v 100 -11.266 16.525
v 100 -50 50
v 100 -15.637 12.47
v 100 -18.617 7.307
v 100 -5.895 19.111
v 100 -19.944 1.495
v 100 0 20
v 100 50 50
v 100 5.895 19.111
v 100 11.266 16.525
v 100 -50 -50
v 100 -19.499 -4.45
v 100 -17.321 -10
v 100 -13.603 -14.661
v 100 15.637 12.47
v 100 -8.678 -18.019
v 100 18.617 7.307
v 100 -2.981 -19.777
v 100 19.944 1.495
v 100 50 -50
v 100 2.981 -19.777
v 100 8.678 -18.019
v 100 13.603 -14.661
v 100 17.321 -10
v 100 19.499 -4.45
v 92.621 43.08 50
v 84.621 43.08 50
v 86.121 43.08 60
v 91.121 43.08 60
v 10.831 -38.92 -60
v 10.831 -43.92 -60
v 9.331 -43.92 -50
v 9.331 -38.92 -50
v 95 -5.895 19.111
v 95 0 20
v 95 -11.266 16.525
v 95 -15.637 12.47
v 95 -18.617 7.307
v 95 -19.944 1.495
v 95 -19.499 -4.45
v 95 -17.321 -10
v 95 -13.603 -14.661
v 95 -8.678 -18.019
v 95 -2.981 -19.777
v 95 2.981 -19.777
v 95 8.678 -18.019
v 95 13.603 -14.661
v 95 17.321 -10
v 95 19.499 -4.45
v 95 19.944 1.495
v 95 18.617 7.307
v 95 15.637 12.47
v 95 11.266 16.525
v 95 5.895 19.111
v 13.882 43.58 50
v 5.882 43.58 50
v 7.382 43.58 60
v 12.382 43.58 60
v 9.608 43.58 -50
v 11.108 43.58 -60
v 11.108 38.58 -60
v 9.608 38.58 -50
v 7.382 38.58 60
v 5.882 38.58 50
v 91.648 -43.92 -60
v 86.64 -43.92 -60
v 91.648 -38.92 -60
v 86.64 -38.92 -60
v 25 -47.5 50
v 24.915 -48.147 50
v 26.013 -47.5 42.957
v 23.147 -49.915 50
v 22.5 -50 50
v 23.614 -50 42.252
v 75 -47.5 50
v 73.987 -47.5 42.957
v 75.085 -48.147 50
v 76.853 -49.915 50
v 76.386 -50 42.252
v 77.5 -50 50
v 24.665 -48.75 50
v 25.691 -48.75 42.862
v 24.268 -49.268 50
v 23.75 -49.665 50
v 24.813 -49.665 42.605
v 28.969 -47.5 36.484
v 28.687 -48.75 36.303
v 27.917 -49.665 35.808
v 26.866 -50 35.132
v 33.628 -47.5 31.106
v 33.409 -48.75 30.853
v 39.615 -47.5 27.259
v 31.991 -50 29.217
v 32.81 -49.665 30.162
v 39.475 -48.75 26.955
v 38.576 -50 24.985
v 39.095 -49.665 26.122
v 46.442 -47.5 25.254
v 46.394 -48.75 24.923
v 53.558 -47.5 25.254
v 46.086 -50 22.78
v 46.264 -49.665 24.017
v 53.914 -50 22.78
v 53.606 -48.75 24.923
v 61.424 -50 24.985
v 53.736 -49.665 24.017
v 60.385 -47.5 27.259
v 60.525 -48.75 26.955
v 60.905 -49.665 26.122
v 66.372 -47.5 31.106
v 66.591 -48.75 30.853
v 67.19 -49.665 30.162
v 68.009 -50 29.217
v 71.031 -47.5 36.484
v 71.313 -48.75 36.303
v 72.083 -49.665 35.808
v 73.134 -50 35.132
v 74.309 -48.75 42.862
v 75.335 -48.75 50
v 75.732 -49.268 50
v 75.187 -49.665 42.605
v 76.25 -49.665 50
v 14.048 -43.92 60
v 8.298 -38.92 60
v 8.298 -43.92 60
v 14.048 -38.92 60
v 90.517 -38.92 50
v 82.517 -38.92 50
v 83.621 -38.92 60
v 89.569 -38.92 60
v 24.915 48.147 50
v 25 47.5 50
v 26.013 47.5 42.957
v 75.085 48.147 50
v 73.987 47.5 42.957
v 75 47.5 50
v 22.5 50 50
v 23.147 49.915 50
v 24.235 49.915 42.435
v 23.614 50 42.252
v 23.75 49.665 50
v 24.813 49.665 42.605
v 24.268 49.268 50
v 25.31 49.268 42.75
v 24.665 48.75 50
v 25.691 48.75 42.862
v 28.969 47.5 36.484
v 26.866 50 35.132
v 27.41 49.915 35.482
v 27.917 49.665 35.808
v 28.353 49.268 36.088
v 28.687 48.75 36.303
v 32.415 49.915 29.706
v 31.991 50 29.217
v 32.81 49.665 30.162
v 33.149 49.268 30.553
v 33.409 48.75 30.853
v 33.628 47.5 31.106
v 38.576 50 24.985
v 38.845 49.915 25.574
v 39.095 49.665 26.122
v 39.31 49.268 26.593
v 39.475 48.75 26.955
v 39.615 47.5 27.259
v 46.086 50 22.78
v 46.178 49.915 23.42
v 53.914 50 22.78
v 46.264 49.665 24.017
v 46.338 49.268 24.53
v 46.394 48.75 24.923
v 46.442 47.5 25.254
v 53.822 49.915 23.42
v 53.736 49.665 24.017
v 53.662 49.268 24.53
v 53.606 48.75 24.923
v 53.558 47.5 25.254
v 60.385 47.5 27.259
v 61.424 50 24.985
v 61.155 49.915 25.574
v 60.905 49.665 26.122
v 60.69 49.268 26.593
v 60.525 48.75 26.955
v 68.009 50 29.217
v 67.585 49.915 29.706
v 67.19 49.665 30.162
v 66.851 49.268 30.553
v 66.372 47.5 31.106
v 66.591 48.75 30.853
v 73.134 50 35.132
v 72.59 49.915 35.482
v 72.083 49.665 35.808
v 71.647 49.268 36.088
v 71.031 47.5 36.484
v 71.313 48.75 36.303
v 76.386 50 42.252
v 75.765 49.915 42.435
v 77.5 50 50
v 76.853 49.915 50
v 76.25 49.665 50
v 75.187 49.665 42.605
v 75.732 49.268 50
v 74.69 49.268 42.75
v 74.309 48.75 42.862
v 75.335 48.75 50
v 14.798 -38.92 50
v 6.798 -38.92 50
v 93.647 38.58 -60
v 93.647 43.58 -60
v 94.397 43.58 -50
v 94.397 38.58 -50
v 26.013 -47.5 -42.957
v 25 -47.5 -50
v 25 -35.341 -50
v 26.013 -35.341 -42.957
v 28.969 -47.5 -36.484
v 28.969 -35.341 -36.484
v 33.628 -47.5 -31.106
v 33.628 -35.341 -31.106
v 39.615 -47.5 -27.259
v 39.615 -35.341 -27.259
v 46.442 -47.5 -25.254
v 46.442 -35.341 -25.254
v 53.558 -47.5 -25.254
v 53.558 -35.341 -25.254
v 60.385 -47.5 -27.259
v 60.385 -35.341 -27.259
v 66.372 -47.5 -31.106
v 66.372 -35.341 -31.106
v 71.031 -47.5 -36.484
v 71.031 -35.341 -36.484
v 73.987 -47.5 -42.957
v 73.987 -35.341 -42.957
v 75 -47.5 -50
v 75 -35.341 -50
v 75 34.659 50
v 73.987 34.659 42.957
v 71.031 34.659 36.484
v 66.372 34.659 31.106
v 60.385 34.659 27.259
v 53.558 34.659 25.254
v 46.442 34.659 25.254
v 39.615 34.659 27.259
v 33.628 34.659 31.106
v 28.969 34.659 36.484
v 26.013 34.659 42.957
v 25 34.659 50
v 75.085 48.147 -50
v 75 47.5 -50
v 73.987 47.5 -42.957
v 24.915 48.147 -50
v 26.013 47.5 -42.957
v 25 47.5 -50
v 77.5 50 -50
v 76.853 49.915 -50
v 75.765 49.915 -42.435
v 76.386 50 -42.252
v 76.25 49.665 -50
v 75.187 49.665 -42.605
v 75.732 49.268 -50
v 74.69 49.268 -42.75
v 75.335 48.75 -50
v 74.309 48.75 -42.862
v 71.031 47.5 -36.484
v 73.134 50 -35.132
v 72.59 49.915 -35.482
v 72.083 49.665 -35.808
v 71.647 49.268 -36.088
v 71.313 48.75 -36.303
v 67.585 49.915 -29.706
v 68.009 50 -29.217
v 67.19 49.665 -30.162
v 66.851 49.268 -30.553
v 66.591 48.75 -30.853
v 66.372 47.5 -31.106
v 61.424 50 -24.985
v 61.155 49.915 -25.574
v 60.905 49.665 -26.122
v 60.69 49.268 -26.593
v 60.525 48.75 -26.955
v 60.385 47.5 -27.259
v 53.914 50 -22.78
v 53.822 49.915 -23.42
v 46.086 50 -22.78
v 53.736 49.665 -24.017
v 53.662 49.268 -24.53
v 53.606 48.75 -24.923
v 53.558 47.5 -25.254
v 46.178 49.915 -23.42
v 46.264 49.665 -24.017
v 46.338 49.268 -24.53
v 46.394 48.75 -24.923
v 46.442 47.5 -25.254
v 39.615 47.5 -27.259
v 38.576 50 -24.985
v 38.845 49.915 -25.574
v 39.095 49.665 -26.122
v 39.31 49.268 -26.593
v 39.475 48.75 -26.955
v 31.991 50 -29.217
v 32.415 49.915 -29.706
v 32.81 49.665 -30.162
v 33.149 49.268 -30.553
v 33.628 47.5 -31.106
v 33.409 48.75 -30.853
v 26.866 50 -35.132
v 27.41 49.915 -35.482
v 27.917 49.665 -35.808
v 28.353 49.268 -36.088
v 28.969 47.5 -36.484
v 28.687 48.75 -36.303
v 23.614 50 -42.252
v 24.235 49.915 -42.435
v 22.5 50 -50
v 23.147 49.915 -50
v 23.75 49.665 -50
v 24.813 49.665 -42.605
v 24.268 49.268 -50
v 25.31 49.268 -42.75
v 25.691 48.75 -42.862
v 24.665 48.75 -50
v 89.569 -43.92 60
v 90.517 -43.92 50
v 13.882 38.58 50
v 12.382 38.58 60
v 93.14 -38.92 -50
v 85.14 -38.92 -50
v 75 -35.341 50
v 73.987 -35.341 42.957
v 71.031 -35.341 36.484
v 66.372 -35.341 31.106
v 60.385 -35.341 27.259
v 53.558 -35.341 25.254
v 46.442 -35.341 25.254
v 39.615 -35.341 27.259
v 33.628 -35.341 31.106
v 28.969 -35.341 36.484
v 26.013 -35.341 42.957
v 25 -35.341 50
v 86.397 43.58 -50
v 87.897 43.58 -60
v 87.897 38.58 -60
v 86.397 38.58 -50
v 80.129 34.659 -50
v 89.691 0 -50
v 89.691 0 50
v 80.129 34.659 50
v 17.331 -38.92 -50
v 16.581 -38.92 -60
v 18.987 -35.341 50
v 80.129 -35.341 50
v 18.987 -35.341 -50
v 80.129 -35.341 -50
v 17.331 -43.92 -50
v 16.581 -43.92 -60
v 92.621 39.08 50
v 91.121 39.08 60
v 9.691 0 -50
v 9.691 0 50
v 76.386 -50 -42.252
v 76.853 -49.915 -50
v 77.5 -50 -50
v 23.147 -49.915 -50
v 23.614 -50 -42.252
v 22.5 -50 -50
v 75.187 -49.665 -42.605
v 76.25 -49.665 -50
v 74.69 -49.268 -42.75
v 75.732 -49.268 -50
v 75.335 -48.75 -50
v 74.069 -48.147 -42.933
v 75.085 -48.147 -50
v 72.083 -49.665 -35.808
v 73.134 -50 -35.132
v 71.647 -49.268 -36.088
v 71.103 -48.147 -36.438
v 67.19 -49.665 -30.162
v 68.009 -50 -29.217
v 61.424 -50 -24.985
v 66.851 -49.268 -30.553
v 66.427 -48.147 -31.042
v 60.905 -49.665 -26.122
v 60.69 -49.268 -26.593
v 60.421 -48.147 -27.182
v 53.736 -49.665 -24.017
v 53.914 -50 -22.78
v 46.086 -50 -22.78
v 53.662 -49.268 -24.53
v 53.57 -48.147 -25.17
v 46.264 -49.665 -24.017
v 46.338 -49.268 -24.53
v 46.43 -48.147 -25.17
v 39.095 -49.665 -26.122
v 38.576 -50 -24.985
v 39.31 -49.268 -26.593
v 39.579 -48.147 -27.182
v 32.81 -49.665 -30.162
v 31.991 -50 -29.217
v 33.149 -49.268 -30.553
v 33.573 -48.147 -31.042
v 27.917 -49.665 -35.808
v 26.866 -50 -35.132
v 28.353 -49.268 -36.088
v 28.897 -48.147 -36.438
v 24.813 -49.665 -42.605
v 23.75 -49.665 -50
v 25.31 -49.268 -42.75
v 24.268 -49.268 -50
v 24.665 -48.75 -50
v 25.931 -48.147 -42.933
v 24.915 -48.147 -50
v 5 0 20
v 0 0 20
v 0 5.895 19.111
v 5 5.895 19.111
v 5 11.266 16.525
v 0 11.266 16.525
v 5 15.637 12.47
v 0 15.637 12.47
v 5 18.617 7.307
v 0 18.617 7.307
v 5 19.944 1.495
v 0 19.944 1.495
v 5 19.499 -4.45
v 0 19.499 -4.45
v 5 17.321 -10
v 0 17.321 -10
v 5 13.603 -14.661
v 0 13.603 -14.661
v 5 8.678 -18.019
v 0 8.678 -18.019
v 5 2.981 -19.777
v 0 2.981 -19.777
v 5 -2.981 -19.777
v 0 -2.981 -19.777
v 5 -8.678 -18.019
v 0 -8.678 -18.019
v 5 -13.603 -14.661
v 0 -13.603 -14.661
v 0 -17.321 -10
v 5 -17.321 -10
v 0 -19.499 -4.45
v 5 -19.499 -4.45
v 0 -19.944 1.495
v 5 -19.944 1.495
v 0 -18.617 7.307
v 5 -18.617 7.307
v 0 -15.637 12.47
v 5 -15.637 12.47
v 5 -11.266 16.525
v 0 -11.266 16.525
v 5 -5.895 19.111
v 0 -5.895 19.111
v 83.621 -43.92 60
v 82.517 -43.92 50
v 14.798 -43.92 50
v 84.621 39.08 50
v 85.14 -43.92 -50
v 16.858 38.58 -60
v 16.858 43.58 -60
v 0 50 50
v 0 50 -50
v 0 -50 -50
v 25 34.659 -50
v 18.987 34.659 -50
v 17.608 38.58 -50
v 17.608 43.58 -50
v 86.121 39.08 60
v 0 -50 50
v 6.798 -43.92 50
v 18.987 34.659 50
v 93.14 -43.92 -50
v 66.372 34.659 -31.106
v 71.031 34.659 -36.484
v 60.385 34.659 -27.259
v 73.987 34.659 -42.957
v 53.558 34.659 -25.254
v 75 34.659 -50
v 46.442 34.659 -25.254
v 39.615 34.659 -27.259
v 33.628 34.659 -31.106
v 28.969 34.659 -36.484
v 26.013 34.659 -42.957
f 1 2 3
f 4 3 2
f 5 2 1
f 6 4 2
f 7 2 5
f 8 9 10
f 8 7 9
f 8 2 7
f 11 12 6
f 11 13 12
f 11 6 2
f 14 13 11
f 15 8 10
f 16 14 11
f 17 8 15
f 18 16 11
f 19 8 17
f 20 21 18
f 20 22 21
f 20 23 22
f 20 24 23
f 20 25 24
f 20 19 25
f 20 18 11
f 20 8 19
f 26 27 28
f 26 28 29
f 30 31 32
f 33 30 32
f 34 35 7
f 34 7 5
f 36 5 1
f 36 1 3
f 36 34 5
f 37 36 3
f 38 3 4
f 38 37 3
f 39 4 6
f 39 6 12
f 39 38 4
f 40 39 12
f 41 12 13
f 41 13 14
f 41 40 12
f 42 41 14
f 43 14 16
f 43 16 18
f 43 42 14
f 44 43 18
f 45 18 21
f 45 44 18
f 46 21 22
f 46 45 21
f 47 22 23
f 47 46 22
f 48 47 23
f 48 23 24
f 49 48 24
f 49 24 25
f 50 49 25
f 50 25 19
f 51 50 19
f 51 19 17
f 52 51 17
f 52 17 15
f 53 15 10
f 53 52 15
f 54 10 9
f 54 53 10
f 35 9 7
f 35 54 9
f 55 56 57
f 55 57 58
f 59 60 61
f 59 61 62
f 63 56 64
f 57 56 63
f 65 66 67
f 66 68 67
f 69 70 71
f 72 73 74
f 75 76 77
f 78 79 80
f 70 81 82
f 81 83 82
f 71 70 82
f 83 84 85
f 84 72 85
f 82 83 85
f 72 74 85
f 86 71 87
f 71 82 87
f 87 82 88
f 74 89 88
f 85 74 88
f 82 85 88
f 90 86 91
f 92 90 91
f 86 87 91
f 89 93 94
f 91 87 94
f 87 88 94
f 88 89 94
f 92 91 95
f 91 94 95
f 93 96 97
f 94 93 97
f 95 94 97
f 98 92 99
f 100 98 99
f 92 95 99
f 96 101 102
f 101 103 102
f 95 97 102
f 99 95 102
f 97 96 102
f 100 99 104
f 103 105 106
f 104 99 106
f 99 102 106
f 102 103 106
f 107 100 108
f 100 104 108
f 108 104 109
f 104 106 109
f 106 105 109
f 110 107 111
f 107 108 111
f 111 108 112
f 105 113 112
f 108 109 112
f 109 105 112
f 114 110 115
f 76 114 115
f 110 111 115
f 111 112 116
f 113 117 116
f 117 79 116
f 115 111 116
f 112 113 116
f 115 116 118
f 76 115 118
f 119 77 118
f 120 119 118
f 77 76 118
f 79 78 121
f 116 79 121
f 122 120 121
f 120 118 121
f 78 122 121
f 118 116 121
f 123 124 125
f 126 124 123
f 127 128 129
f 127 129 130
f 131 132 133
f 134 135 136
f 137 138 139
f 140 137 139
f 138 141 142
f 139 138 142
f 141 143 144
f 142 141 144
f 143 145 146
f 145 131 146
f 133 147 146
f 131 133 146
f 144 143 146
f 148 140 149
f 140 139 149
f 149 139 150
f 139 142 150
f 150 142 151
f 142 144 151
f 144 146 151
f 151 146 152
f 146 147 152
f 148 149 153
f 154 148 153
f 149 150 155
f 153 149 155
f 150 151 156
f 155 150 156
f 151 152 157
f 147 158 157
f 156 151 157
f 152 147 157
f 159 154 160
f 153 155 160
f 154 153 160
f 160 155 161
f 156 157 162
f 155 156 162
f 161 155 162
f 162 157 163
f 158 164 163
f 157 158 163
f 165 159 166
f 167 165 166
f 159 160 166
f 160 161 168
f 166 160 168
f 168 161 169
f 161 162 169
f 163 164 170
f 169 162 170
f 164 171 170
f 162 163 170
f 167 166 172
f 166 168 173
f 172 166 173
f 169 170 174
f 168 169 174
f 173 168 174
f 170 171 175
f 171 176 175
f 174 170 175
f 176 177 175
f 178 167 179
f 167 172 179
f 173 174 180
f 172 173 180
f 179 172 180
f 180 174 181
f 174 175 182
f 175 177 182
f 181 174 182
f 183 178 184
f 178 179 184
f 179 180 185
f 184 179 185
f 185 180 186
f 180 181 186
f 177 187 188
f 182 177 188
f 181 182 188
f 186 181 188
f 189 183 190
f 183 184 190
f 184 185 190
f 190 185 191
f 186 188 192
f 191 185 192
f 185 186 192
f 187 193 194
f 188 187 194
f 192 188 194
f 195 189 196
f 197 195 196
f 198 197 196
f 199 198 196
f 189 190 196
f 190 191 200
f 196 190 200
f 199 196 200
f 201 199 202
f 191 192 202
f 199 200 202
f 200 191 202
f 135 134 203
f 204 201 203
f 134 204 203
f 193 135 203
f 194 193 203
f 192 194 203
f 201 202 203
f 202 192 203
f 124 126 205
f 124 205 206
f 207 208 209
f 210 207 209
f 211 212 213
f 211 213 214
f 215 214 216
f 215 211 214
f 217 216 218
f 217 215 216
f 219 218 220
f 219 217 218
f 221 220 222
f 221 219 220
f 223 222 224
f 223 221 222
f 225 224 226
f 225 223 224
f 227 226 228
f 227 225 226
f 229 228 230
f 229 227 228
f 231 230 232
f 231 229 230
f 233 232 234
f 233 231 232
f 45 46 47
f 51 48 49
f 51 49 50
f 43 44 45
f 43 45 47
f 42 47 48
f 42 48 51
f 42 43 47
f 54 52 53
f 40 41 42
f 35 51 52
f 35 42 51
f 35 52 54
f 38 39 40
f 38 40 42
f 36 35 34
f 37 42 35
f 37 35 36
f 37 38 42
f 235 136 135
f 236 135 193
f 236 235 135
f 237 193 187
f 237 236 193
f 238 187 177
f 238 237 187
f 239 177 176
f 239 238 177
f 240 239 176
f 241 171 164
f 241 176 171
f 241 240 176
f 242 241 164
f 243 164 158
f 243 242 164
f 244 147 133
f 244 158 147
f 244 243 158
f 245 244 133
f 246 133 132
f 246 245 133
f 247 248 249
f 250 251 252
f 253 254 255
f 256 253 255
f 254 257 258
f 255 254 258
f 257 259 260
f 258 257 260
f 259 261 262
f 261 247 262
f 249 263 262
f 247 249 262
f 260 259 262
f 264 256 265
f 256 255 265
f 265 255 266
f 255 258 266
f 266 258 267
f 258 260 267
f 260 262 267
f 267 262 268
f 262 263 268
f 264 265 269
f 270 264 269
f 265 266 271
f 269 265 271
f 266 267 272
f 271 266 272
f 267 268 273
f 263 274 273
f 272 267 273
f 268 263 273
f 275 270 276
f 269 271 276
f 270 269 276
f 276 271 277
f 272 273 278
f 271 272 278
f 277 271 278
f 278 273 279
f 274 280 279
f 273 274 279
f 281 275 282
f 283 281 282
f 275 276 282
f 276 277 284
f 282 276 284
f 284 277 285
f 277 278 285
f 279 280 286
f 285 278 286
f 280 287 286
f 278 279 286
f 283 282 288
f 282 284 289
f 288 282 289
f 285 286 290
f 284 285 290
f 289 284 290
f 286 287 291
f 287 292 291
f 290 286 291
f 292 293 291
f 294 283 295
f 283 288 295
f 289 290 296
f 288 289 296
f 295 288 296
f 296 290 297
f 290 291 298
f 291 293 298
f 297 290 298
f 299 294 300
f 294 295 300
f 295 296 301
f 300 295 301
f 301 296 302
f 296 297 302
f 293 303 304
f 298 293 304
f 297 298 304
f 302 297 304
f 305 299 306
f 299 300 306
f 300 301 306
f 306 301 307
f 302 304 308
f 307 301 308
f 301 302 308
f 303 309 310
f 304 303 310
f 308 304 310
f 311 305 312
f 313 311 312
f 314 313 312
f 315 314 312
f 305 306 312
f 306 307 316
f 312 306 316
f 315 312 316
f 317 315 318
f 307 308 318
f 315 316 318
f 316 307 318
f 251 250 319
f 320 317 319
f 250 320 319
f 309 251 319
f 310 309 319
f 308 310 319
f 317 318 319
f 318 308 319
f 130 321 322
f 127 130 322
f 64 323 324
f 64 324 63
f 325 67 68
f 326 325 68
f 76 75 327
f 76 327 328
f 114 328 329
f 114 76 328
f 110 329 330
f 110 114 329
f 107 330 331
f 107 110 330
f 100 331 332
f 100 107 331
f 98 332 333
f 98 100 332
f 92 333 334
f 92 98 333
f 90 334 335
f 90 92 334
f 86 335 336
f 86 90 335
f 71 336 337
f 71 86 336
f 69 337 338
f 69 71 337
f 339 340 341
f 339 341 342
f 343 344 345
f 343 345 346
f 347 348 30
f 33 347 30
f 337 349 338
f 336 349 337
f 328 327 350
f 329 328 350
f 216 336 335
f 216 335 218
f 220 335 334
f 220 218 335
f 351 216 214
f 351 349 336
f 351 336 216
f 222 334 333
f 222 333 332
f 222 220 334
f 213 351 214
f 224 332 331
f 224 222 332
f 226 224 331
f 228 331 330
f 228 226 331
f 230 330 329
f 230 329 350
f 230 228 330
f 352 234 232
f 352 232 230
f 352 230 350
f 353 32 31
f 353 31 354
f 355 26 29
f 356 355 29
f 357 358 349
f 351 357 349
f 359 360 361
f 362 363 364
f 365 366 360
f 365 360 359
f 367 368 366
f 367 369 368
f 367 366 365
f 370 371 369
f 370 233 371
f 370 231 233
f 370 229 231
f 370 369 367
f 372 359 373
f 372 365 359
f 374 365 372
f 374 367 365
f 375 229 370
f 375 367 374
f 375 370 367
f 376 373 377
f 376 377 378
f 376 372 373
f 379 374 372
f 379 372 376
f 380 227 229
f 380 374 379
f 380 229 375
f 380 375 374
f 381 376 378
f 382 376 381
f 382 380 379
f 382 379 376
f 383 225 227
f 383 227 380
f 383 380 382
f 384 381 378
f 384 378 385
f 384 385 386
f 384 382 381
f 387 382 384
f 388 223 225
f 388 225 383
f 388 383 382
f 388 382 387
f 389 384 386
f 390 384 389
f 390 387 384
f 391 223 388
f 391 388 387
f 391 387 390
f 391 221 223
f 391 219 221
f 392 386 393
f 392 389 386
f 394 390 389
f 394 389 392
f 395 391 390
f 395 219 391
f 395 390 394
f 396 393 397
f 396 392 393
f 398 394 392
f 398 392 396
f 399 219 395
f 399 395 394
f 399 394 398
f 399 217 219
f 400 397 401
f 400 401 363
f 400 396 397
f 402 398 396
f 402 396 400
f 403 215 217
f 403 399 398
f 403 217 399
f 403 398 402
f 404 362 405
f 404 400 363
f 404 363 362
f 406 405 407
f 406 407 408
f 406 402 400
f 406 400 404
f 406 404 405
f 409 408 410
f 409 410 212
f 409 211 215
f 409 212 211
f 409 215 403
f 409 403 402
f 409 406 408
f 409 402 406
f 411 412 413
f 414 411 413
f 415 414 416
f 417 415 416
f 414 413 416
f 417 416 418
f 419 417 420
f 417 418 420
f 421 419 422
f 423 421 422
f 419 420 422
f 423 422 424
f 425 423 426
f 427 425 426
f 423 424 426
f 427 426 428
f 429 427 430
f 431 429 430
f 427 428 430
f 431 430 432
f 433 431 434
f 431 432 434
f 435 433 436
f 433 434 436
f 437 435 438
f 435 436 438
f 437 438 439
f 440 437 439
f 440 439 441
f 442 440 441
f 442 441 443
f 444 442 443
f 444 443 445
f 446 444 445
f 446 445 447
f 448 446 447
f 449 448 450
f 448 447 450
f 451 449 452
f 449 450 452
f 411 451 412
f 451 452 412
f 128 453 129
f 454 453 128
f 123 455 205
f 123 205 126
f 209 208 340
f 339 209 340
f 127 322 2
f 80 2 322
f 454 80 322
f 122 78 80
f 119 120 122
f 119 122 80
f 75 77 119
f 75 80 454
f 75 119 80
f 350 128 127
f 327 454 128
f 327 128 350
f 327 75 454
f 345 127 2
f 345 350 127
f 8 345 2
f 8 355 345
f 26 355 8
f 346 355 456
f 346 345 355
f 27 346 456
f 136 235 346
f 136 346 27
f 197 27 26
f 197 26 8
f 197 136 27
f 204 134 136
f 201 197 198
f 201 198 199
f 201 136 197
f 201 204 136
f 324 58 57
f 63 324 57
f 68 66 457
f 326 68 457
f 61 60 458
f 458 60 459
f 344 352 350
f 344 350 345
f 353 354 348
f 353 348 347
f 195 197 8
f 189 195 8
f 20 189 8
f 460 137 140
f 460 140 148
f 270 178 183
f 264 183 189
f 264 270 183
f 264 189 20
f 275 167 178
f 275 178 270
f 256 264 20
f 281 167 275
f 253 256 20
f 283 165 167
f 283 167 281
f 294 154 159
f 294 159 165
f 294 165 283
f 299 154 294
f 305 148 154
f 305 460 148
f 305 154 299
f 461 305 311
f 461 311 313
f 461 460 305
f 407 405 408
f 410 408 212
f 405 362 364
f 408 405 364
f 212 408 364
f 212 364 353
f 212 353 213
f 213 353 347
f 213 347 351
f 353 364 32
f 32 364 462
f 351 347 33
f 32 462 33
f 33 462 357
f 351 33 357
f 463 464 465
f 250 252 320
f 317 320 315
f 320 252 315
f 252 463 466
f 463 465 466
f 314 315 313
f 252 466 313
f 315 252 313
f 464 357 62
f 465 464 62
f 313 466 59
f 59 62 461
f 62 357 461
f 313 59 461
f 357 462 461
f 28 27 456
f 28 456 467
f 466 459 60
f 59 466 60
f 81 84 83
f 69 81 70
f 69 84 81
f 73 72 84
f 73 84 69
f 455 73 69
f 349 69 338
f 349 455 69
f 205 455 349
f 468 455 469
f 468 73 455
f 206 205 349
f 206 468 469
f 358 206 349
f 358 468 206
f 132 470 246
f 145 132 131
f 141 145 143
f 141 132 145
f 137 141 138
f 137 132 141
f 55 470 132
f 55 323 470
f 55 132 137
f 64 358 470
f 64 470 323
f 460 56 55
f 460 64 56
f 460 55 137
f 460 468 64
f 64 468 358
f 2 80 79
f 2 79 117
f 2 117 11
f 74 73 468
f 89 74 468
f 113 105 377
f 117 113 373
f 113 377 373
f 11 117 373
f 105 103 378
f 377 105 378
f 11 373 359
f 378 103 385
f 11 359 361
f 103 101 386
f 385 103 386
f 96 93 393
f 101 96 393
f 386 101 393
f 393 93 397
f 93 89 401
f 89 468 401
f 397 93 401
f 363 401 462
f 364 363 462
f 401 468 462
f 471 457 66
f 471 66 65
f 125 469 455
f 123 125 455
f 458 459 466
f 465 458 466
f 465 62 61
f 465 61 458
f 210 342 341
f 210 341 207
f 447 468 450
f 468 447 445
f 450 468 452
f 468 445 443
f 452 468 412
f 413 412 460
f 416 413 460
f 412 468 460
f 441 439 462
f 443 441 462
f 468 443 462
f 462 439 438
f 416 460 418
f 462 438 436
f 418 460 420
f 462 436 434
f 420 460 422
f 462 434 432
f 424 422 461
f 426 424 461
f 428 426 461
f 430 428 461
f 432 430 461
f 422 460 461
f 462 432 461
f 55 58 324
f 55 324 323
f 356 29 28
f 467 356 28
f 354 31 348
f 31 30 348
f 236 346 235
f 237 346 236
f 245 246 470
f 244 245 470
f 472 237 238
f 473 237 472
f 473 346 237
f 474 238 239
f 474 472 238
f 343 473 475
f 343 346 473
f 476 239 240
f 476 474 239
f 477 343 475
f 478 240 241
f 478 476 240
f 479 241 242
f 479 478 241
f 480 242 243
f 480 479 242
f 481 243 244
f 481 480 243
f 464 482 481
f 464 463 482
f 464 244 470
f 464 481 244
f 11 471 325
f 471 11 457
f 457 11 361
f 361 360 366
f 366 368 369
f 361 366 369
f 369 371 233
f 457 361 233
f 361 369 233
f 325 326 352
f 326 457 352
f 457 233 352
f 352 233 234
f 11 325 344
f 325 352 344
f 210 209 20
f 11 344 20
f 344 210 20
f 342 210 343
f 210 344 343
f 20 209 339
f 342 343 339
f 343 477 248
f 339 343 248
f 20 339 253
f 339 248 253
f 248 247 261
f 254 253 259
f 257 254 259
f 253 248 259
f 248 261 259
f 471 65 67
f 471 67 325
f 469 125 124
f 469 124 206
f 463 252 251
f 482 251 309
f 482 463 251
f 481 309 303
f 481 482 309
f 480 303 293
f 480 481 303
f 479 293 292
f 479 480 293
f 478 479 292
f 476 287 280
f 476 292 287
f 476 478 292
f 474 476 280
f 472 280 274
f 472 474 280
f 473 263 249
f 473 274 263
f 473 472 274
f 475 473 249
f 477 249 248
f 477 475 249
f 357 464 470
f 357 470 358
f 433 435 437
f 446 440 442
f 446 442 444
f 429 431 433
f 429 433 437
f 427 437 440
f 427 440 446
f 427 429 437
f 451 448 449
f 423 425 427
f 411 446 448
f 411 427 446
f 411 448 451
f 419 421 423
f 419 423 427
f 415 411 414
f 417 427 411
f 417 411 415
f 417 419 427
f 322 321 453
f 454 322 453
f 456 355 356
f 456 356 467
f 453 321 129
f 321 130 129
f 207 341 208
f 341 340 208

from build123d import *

# Parameters (mm, degrees)
SKETCH1_W               = 100
SKETCH1_H               = 100
BOSS_EXTRUDE1_DEPTH     = 100
SKETCH2_R               = 20
CUT_EXTRUDE1_DEPTH      = 5
CUT_EXTRUDE2_START      = -5
SKETCH3_R               = 20
CUT_EXTRUDE2_DEPTH      = 5
CUT_EXTRUDE3_DEPTH      = 151
CUT_EXTRUDE5_DEPTH      = 151
CUT_EXTRUDE5_DEPTH_BACK = 151
CUT_EXTRUDE6_DEPTH      = 151
CUT_EXTRUDE6_DEPTH_BACK = 151
FILLET3_R               = 2.5
BOSS_EXTRUDE3_DEPTH     = 10
CUT_EXTRUDE8_DEPTH      = 10
CUT_EXTRUDE9_DEPTH      = 10
BOSS_EXTRUDE4_DEPTH     = 10
CUT_EXTRUDE11_DEPTH     = 10
CUT_EXTRUDE12_DEPTH     = 10
BOSS_EXTRUDE5_DEPTH     = 10
CUT_EXTRUDE13_DEPTH     = 10
CUT_EXTRUDE15_DEPTH     = 10
BOSS_EXTRUDE6_DEPTH     = 10
CUT_EXTRUDE16_DEPTH     = 10
CUT_EXTRUDE17_DEPTH     = 10
BOSS_EXTRUDE7_DEPTH     = 10
CUT_EXTRUDE18_DEPTH     = 10
CUT_EXTRUDE19_DEPTH     = 10
BOSS_EXTRUDE8_DEPTH     = 10
CUT_EXTRUDE20_DEPTH     = 10
CUT_EXTRUDE21_DEPTH     = 10
BOSS_EXTRUDE9_DEPTH     = 10
CUT_EXTRUDE22_DEPTH     = 10
CUT_EXTRUDE23_DEPTH     = 10
BOSS_EXTRUDE10_DEPTH    = 10
CUT_EXTRUDE24_DEPTH     = 10
CUT_EXTRUDE25_DEPTH     = 10


with BuildPart() as part:
    # Sketch1 → Boss-Extrude1 (new body)
    with BuildSketch(Plane(origin=(0, 0, 0), x_dir=(0, 0, -1), z_dir=(1, 0, 0))):
        Rectangle(SKETCH1_W, SKETCH1_H)
    extrude(amount=BOSS_EXTRUDE1_DEPTH)

    # Sketch2 → Cut-Extrude1 (cut)
    with BuildSketch(Plane.ZY):
        Circle(SKETCH2_R)
    extrude(amount=-CUT_EXTRUDE1_DEPTH, mode=Mode.SUBTRACT)

    # Sketch3 → Cut-Extrude2 (cut)
    with BuildSketch(Plane(origin=(100, 0, 0), x_dir=(0, 0, -1), z_dir=(1, 0, 0)).offset(CUT_EXTRUDE2_START)):
        with Locations(Location((0, 0, 0), (0, 0, 180))):
            Circle(SKETCH3_R)
    extrude(amount=CUT_EXTRUDE2_DEPTH, mode=Mode.SUBTRACT)

    # Sketch4 → Cut-Extrude3 (cut, through all)
    with BuildSketch(Plane(origin=(0, 0, -50), x_dir=(-1, 0, 0), z_dir=(0, 0, -1))):
        Polygon((-80.128941466, 34.659382406), (-18.986632905, 34.659382406), (-9.691227462, 0), (-18.986632905, -35.340617594), (-80.128941466, -35.340617594), (-89.691227462, 0), align=None)
    extrude(amount=-CUT_EXTRUDE3_DEPTH, mode=Mode.SUBTRACT)

    # Sketch15 → Cut-Extrude5 (cut, two sides: drawn at the far end of the back side and taken through both)
    with BuildSketch(Plane(origin=(0, 50, 0), x_dir=(1, 0, 0), z_dir=(0, 1, 0)).offset(-CUT_EXTRUDE5_DEPTH_BACK)):
        with BuildLine():
            Line((75, -310), (75, -50))
            ThreePointArc((75, -50), (50, -25), (25, -50))
            Line((25, -50), (25, -310))
            Line((25, -310), (25, -830))
            Line((25, -830), (75, -830))
            Line((75, -830), (75, -310))
        make_face()
    extrude(amount=CUT_EXTRUDE5_DEPTH + CUT_EXTRUDE5_DEPTH_BACK, mode=Mode.SUBTRACT)

    # Sketch16 → Cut-Extrude6 (cut, two sides: drawn at the far end of the back side and taken through both)
    with BuildSketch(Plane(origin=(0, 50, 0), x_dir=(1, 0, 0), z_dir=(0, 1, 0)).offset(-CUT_EXTRUDE6_DEPTH_BACK)):
        with BuildLine():
            Line((25, 310), (25, 50))
            ThreePointArc((25, 50), (50, 25), (75, 50))
            Line((75, 50), (75, 310))
            Line((75, 310), (75, 830))
            Line((75, 830), (25, 830))
            Line((25, 830), (25, 310))
        make_face()
    extrude(amount=CUT_EXTRUDE6_DEPTH + CUT_EXTRUDE6_DEPTH_BACK, mode=Mode.SUBTRACT)

    # Fillet3
    fillet3_edges = [part.edges().sort_by_distance(p)[0] for p in [
        (50, -50, 25),
        (50, 50, 25),
        (50, -50, -25),
        (50, 50, -25),
    ]]
    fillet(fillet3_edges, radius=FILLET3_R)

    # Sketch17 → Boss-Extrude3 (add)
    with BuildSketch(Plane.XY.offset(50)):
        with BuildLine():
            Line((84.621199284, 43.079691203), (92.621199284, 43.079691203))
            ThreePointArc((92.621199284, 43.079691203), (94.621199284, 41.079691203), (92.621199284, 39.079691203))
            Line((92.621199284, 39.079691203), (84.621199284, 39.079691203))
            ThreePointArc((84.621199284, 39.079691203), (82.621199284, 41.079691203), (84.621199284, 43.079691203))
        make_face()
    extrude(amount=BOSS_EXTRUDE3_DEPTH)

    # Sketch18 → Cut-Extrude8 (cut)
    with BuildSketch(Plane(origin=(0, 43.079691203, 0), x_dir=(1, 0, 0), z_dir=(0, 1, 0))):
        Polygon((84.621199284, -50), (86.121199284, -60), (82.621199284, -60), (82.621199284, -50), align=None)
    extrude(amount=-CUT_EXTRUDE8_DEPTH, mode=Mode.SUBTRACT)

    # Sketch20 → Cut-Extrude9 (cut)
    with BuildSketch(Plane(origin=(0, 43.079691203, 0), x_dir=(1, 0, 0), z_dir=(0, 1, 0))):
        Polygon((91.121199284, -60), (94.621199284, -60), (94.621199284, -50), (92.621199284, -50), align=None)
    extrude(amount=-CUT_EXTRUDE9_DEPTH, mode=Mode.SUBTRACT)

    # Sketch24 → Boss-Extrude4 (add)
    with BuildSketch(Plane.XY.offset(50)):
        with BuildLine():
            Line((5.882221412, 43.579691203), (13.882221412, 43.579691203))
            ThreePointArc((13.882221412, 43.579691203), (16.382221412, 41.079691203), (13.882221412, 38.579691203))
            Line((13.882221412, 38.579691203), (5.882221412, 38.579691203))
            ThreePointArc((5.882221412, 38.579691203), (3.382221412, 41.079691203), (5.882221412, 43.579691203))
        make_face()
    extrude(amount=BOSS_EXTRUDE4_DEPTH)

    # Sketch25 → Cut-Extrude11 (cut)
    with BuildSketch(Plane(origin=(0, 43.579691203, 0), x_dir=(1, 0, 0), z_dir=(0, 1, 0))):
        Polygon((3.382221412, -50), (5.882221412, -50), (7.382221412, -60), (3.382221412, -60), align=None)
    extrude(amount=-CUT_EXTRUDE11_DEPTH, mode=Mode.SUBTRACT)

    # Sketch26 → Cut-Extrude12 (cut)
    with BuildSketch(Plane(origin=(0, 43.579691203, 0), x_dir=(1, 0, 0), z_dir=(0, 1, 0))):
        Polygon((12.382221412, -60), (13.882221412, -50), (16.382221412, -50), (16.382221412, -60), align=None)
    extrude(amount=-CUT_EXTRUDE12_DEPTH, mode=Mode.SUBTRACT)

    # Sketch27 → Boss-Extrude5 (add)
    with BuildSketch(Plane.XY.offset(50)):
        with BuildLine():
            Line((6.7978639, -43.920308797), (14.7978639, -43.920308797))
            ThreePointArc((14.7978639, -43.920308797), (17.2978639, -41.420308797), (14.7978639, -38.920308797))
            Line((14.7978639, -38.920308797), (6.7978639, -38.920308797))
            ThreePointArc((6.7978639, -38.920308797), (4.2978639, -41.420308797), (6.7978639, -43.920308797))
        make_face()
    extrude(amount=BOSS_EXTRUDE5_DEPTH)

    # Sketch29 → Cut-Extrude13 (cut)
    with BuildSketch(Plane.XZ.offset(43.920308797)):
        Polygon((8.2978639, 60), (6.7978639, 50), (4.2978639, 50), (4.2978639, 60), align=None)
    extrude(amount=-CUT_EXTRUDE13_DEPTH, mode=Mode.SUBTRACT)

    # Sketch30 → Cut-Extrude15 (cut)
    with BuildSketch(Plane.XZ.offset(43.920308797)):
        Polygon((14.0478639, 60), (17.2978639, 60), (17.2978639, 50), (14.7978639, 50), align=None)
    extrude(amount=-CUT_EXTRUDE15_DEPTH, mode=Mode.SUBTRACT)

    # Sketch31 → Boss-Extrude6 (add)
    with BuildSketch(Plane.XY.offset(50)):
        with BuildLine():
            Line((82.517325635, -38.920308797), (90.517325635, -38.920308797))
            ThreePointArc((90.517325635, -38.920308797), (93.017325635, -41.420308797), (90.517325635, -43.920308797))
            Line((90.517325635, -43.920308797), (82.517325635, -43.920308797))
            ThreePointArc((82.517325635, -43.920308797), (80.017325635, -41.420308797), (82.517325635, -38.920308797))
        make_face()
    extrude(amount=BOSS_EXTRUDE6_DEPTH)

    # Sketch33 → Cut-Extrude16 (cut)
    with BuildSketch(Plane.XZ.offset(43.920308797)):
        Polygon((83.621199284, 60), (82.517325635, 50), (80.017325635, 50), (80.017325635, 60), align=None)
    extrude(amount=-CUT_EXTRUDE16_DEPTH, mode=Mode.SUBTRACT)

    # Sketch34 → Cut-Extrude17 (cut)
    with BuildSketch(Plane.XZ.offset(43.920308797)):
        Polygon((89.56926246, 60), (90.517325635, 50), (93.017325635, 50), (93.017325635, 60), align=None)
    extrude(amount=-CUT_EXTRUDE17_DEPTH, mode=Mode.SUBTRACT)

    # Sketch35 → Boss-Extrude7 (add)
    with BuildSketch(Plane(origin=(0, 0, -50), x_dir=(-1, 0, 0), z_dir=(0, 0, -1))):
        with BuildLine():
            Line((-17.608468635, 43.579691203), (-9.608468635, 43.579691203))
            ThreePointArc((-9.608468635, 43.579691203), (-7.108468635, 41.079691203), (-9.608468635, 38.579691203))
            Line((-9.608468635, 38.579691203), (-17.608468635, 38.579691203))
            ThreePointArc((-17.608468635, 38.579691203), (-20.108468635, 41.079691203), (-17.608468635, 43.579691203))
        make_face()
    extrude(amount=BOSS_EXTRUDE7_DEPTH)

    # Sketch36 → Cut-Extrude18 (cut)
    with BuildSketch(Plane(origin=(0, 43.579691203, 0), x_dir=(1, 0, 0), z_dir=(0, 1, 0))):
        Polygon((11.108468635, 60), (9.608468635, 50), (7.108468635, 50), (7.108468635, 60), align=None)
    extrude(amount=-CUT_EXTRUDE18_DEPTH, mode=Mode.SUBTRACT)

    # Sketch37 → Cut-Extrude19 (cut)
    with BuildSketch(Plane(origin=(0, 43.579691203, 0), x_dir=(1, 0, 0), z_dir=(0, 1, 0))):
        Polygon((16.858468635, 60), (17.608468635, 50), (20.108468635, 50), (20.108468635, 60), align=None)
    extrude(amount=-CUT_EXTRUDE19_DEPTH, mode=Mode.SUBTRACT)

    # Sketch38 → Boss-Extrude8 (add)
    with BuildSketch(Plane(origin=(0, 0, -50), x_dir=(-1, 0, 0), z_dir=(0, 0, -1))):
        with BuildLine():
            Line((-17.330505729, -38.920308797), (-9.330505729, -38.920308797))
            ThreePointArc((-9.330505729, -38.920308797), (-6.830505729, -41.420308797), (-9.330505729, -43.920308797))
            Line((-9.330505729, -43.920308797), (-17.330505729, -43.920308797))
            ThreePointArc((-17.330505729, -43.920308797), (-19.830505729, -41.420308797), (-17.330505729, -38.920308797))
        make_face()
    extrude(amount=BOSS_EXTRUDE8_DEPTH)

    # Sketch40 → Cut-Extrude20 (cut)
    with BuildSketch(Plane.XZ.offset(43.920308797)):
        Polygon((10.830505729, -60), (9.330505729, -50), (6.830505729, -50), (6.830505729, -60), align=None)
    extrude(amount=-CUT_EXTRUDE20_DEPTH, mode=Mode.SUBTRACT)

    # Sketch41 → Cut-Extrude21 (cut)
    with BuildSketch(Plane.XZ.offset(43.920308797)):
        Polygon((16.580505729, -60), (17.330505729, -50), (19.830505729, -50), (19.830505729, -60), align=None)
    extrude(amount=-CUT_EXTRUDE21_DEPTH, mode=Mode.SUBTRACT)

    # Sketch42 → Boss-Extrude9 (add)
    with BuildSketch(Plane(origin=(0, 0, -50), x_dir=(-1, 0, 0), z_dir=(0, 0, -1))):
        with BuildLine():
            Line((-94.397005035, 43.579691203), (-86.397005035, 43.579691203))
            ThreePointArc((-86.397005035, 43.579691203), (-83.897005035, 41.079691203), (-86.397005035, 38.579691203))
            Line((-86.397005035, 38.579691203), (-94.397005035, 38.579691203))
            ThreePointArc((-94.397005035, 38.579691203), (-96.897005035, 41.079691203), (-94.397005035, 43.579691203))
        make_face()
    extrude(amount=BOSS_EXTRUDE9_DEPTH)

    # Sketch43 → Cut-Extrude22 (cut)
    with BuildSketch(Plane(origin=(0, 43.579691203, 0), x_dir=(1, 0, 0), z_dir=(0, 1, 0))):
        Polygon((87.897005035, 60), (86.397005035, 50), (83.897005035, 50), (83.897005035, 60), align=None)
    extrude(amount=-CUT_EXTRUDE22_DEPTH, mode=Mode.SUBTRACT)

    # Sketch44 → Cut-Extrude23 (cut)
    with BuildSketch(Plane(origin=(0, 43.579691203, 0), x_dir=(1, 0, 0), z_dir=(0, 1, 0))):
        Polygon((93.647005035, 60), (94.397005035, 50), (96.897005035, 50), (96.897005035, 60), align=None)
    extrude(amount=-CUT_EXTRUDE23_DEPTH, mode=Mode.SUBTRACT)

    # Sketch45 → Boss-Extrude10 (add)
    with BuildSketch(Plane(origin=(0, 0, -50), x_dir=(-1, 0, 0), z_dir=(0, 0, -1))):
        with BuildLine():
            Line((-93.140486024, -38.920308797), (-85.140486024, -38.920308797))
            ThreePointArc((-85.140486024, -38.920308797), (-82.640486024, -41.420308797), (-85.140486024, -43.920308797))
            Line((-85.140486024, -43.920308797), (-93.140486024, -43.920308797))
            ThreePointArc((-93.140486024, -43.920308797), (-95.640486024, -41.420308797), (-93.140486024, -38.920308797))
        make_face()
    extrude(amount=BOSS_EXTRUDE10_DEPTH)

    # Sketch47 → Cut-Extrude24 (cut)
    with BuildSketch(Plane.XZ.offset(43.920308797)):
        Polygon((86.640486024, -60), (85.140486024, -50), (82.640486024, -50), (82.640486024, -60), align=None)
    extrude(amount=-CUT_EXTRUDE24_DEPTH, mode=Mode.SUBTRACT)

    # Sketch48 → Cut-Extrude25 (cut)
    with BuildSketch(Plane.XZ.offset(43.920308797)):
        Polygon((91.647943496, -60), (93.140486024, -50), (95.640486024, -50), (95.640486024, -60), align=None)
    extrude(amount=-CUT_EXTRUDE25_DEPTH, mode=Mode.SUBTRACT)


solid = part.part
